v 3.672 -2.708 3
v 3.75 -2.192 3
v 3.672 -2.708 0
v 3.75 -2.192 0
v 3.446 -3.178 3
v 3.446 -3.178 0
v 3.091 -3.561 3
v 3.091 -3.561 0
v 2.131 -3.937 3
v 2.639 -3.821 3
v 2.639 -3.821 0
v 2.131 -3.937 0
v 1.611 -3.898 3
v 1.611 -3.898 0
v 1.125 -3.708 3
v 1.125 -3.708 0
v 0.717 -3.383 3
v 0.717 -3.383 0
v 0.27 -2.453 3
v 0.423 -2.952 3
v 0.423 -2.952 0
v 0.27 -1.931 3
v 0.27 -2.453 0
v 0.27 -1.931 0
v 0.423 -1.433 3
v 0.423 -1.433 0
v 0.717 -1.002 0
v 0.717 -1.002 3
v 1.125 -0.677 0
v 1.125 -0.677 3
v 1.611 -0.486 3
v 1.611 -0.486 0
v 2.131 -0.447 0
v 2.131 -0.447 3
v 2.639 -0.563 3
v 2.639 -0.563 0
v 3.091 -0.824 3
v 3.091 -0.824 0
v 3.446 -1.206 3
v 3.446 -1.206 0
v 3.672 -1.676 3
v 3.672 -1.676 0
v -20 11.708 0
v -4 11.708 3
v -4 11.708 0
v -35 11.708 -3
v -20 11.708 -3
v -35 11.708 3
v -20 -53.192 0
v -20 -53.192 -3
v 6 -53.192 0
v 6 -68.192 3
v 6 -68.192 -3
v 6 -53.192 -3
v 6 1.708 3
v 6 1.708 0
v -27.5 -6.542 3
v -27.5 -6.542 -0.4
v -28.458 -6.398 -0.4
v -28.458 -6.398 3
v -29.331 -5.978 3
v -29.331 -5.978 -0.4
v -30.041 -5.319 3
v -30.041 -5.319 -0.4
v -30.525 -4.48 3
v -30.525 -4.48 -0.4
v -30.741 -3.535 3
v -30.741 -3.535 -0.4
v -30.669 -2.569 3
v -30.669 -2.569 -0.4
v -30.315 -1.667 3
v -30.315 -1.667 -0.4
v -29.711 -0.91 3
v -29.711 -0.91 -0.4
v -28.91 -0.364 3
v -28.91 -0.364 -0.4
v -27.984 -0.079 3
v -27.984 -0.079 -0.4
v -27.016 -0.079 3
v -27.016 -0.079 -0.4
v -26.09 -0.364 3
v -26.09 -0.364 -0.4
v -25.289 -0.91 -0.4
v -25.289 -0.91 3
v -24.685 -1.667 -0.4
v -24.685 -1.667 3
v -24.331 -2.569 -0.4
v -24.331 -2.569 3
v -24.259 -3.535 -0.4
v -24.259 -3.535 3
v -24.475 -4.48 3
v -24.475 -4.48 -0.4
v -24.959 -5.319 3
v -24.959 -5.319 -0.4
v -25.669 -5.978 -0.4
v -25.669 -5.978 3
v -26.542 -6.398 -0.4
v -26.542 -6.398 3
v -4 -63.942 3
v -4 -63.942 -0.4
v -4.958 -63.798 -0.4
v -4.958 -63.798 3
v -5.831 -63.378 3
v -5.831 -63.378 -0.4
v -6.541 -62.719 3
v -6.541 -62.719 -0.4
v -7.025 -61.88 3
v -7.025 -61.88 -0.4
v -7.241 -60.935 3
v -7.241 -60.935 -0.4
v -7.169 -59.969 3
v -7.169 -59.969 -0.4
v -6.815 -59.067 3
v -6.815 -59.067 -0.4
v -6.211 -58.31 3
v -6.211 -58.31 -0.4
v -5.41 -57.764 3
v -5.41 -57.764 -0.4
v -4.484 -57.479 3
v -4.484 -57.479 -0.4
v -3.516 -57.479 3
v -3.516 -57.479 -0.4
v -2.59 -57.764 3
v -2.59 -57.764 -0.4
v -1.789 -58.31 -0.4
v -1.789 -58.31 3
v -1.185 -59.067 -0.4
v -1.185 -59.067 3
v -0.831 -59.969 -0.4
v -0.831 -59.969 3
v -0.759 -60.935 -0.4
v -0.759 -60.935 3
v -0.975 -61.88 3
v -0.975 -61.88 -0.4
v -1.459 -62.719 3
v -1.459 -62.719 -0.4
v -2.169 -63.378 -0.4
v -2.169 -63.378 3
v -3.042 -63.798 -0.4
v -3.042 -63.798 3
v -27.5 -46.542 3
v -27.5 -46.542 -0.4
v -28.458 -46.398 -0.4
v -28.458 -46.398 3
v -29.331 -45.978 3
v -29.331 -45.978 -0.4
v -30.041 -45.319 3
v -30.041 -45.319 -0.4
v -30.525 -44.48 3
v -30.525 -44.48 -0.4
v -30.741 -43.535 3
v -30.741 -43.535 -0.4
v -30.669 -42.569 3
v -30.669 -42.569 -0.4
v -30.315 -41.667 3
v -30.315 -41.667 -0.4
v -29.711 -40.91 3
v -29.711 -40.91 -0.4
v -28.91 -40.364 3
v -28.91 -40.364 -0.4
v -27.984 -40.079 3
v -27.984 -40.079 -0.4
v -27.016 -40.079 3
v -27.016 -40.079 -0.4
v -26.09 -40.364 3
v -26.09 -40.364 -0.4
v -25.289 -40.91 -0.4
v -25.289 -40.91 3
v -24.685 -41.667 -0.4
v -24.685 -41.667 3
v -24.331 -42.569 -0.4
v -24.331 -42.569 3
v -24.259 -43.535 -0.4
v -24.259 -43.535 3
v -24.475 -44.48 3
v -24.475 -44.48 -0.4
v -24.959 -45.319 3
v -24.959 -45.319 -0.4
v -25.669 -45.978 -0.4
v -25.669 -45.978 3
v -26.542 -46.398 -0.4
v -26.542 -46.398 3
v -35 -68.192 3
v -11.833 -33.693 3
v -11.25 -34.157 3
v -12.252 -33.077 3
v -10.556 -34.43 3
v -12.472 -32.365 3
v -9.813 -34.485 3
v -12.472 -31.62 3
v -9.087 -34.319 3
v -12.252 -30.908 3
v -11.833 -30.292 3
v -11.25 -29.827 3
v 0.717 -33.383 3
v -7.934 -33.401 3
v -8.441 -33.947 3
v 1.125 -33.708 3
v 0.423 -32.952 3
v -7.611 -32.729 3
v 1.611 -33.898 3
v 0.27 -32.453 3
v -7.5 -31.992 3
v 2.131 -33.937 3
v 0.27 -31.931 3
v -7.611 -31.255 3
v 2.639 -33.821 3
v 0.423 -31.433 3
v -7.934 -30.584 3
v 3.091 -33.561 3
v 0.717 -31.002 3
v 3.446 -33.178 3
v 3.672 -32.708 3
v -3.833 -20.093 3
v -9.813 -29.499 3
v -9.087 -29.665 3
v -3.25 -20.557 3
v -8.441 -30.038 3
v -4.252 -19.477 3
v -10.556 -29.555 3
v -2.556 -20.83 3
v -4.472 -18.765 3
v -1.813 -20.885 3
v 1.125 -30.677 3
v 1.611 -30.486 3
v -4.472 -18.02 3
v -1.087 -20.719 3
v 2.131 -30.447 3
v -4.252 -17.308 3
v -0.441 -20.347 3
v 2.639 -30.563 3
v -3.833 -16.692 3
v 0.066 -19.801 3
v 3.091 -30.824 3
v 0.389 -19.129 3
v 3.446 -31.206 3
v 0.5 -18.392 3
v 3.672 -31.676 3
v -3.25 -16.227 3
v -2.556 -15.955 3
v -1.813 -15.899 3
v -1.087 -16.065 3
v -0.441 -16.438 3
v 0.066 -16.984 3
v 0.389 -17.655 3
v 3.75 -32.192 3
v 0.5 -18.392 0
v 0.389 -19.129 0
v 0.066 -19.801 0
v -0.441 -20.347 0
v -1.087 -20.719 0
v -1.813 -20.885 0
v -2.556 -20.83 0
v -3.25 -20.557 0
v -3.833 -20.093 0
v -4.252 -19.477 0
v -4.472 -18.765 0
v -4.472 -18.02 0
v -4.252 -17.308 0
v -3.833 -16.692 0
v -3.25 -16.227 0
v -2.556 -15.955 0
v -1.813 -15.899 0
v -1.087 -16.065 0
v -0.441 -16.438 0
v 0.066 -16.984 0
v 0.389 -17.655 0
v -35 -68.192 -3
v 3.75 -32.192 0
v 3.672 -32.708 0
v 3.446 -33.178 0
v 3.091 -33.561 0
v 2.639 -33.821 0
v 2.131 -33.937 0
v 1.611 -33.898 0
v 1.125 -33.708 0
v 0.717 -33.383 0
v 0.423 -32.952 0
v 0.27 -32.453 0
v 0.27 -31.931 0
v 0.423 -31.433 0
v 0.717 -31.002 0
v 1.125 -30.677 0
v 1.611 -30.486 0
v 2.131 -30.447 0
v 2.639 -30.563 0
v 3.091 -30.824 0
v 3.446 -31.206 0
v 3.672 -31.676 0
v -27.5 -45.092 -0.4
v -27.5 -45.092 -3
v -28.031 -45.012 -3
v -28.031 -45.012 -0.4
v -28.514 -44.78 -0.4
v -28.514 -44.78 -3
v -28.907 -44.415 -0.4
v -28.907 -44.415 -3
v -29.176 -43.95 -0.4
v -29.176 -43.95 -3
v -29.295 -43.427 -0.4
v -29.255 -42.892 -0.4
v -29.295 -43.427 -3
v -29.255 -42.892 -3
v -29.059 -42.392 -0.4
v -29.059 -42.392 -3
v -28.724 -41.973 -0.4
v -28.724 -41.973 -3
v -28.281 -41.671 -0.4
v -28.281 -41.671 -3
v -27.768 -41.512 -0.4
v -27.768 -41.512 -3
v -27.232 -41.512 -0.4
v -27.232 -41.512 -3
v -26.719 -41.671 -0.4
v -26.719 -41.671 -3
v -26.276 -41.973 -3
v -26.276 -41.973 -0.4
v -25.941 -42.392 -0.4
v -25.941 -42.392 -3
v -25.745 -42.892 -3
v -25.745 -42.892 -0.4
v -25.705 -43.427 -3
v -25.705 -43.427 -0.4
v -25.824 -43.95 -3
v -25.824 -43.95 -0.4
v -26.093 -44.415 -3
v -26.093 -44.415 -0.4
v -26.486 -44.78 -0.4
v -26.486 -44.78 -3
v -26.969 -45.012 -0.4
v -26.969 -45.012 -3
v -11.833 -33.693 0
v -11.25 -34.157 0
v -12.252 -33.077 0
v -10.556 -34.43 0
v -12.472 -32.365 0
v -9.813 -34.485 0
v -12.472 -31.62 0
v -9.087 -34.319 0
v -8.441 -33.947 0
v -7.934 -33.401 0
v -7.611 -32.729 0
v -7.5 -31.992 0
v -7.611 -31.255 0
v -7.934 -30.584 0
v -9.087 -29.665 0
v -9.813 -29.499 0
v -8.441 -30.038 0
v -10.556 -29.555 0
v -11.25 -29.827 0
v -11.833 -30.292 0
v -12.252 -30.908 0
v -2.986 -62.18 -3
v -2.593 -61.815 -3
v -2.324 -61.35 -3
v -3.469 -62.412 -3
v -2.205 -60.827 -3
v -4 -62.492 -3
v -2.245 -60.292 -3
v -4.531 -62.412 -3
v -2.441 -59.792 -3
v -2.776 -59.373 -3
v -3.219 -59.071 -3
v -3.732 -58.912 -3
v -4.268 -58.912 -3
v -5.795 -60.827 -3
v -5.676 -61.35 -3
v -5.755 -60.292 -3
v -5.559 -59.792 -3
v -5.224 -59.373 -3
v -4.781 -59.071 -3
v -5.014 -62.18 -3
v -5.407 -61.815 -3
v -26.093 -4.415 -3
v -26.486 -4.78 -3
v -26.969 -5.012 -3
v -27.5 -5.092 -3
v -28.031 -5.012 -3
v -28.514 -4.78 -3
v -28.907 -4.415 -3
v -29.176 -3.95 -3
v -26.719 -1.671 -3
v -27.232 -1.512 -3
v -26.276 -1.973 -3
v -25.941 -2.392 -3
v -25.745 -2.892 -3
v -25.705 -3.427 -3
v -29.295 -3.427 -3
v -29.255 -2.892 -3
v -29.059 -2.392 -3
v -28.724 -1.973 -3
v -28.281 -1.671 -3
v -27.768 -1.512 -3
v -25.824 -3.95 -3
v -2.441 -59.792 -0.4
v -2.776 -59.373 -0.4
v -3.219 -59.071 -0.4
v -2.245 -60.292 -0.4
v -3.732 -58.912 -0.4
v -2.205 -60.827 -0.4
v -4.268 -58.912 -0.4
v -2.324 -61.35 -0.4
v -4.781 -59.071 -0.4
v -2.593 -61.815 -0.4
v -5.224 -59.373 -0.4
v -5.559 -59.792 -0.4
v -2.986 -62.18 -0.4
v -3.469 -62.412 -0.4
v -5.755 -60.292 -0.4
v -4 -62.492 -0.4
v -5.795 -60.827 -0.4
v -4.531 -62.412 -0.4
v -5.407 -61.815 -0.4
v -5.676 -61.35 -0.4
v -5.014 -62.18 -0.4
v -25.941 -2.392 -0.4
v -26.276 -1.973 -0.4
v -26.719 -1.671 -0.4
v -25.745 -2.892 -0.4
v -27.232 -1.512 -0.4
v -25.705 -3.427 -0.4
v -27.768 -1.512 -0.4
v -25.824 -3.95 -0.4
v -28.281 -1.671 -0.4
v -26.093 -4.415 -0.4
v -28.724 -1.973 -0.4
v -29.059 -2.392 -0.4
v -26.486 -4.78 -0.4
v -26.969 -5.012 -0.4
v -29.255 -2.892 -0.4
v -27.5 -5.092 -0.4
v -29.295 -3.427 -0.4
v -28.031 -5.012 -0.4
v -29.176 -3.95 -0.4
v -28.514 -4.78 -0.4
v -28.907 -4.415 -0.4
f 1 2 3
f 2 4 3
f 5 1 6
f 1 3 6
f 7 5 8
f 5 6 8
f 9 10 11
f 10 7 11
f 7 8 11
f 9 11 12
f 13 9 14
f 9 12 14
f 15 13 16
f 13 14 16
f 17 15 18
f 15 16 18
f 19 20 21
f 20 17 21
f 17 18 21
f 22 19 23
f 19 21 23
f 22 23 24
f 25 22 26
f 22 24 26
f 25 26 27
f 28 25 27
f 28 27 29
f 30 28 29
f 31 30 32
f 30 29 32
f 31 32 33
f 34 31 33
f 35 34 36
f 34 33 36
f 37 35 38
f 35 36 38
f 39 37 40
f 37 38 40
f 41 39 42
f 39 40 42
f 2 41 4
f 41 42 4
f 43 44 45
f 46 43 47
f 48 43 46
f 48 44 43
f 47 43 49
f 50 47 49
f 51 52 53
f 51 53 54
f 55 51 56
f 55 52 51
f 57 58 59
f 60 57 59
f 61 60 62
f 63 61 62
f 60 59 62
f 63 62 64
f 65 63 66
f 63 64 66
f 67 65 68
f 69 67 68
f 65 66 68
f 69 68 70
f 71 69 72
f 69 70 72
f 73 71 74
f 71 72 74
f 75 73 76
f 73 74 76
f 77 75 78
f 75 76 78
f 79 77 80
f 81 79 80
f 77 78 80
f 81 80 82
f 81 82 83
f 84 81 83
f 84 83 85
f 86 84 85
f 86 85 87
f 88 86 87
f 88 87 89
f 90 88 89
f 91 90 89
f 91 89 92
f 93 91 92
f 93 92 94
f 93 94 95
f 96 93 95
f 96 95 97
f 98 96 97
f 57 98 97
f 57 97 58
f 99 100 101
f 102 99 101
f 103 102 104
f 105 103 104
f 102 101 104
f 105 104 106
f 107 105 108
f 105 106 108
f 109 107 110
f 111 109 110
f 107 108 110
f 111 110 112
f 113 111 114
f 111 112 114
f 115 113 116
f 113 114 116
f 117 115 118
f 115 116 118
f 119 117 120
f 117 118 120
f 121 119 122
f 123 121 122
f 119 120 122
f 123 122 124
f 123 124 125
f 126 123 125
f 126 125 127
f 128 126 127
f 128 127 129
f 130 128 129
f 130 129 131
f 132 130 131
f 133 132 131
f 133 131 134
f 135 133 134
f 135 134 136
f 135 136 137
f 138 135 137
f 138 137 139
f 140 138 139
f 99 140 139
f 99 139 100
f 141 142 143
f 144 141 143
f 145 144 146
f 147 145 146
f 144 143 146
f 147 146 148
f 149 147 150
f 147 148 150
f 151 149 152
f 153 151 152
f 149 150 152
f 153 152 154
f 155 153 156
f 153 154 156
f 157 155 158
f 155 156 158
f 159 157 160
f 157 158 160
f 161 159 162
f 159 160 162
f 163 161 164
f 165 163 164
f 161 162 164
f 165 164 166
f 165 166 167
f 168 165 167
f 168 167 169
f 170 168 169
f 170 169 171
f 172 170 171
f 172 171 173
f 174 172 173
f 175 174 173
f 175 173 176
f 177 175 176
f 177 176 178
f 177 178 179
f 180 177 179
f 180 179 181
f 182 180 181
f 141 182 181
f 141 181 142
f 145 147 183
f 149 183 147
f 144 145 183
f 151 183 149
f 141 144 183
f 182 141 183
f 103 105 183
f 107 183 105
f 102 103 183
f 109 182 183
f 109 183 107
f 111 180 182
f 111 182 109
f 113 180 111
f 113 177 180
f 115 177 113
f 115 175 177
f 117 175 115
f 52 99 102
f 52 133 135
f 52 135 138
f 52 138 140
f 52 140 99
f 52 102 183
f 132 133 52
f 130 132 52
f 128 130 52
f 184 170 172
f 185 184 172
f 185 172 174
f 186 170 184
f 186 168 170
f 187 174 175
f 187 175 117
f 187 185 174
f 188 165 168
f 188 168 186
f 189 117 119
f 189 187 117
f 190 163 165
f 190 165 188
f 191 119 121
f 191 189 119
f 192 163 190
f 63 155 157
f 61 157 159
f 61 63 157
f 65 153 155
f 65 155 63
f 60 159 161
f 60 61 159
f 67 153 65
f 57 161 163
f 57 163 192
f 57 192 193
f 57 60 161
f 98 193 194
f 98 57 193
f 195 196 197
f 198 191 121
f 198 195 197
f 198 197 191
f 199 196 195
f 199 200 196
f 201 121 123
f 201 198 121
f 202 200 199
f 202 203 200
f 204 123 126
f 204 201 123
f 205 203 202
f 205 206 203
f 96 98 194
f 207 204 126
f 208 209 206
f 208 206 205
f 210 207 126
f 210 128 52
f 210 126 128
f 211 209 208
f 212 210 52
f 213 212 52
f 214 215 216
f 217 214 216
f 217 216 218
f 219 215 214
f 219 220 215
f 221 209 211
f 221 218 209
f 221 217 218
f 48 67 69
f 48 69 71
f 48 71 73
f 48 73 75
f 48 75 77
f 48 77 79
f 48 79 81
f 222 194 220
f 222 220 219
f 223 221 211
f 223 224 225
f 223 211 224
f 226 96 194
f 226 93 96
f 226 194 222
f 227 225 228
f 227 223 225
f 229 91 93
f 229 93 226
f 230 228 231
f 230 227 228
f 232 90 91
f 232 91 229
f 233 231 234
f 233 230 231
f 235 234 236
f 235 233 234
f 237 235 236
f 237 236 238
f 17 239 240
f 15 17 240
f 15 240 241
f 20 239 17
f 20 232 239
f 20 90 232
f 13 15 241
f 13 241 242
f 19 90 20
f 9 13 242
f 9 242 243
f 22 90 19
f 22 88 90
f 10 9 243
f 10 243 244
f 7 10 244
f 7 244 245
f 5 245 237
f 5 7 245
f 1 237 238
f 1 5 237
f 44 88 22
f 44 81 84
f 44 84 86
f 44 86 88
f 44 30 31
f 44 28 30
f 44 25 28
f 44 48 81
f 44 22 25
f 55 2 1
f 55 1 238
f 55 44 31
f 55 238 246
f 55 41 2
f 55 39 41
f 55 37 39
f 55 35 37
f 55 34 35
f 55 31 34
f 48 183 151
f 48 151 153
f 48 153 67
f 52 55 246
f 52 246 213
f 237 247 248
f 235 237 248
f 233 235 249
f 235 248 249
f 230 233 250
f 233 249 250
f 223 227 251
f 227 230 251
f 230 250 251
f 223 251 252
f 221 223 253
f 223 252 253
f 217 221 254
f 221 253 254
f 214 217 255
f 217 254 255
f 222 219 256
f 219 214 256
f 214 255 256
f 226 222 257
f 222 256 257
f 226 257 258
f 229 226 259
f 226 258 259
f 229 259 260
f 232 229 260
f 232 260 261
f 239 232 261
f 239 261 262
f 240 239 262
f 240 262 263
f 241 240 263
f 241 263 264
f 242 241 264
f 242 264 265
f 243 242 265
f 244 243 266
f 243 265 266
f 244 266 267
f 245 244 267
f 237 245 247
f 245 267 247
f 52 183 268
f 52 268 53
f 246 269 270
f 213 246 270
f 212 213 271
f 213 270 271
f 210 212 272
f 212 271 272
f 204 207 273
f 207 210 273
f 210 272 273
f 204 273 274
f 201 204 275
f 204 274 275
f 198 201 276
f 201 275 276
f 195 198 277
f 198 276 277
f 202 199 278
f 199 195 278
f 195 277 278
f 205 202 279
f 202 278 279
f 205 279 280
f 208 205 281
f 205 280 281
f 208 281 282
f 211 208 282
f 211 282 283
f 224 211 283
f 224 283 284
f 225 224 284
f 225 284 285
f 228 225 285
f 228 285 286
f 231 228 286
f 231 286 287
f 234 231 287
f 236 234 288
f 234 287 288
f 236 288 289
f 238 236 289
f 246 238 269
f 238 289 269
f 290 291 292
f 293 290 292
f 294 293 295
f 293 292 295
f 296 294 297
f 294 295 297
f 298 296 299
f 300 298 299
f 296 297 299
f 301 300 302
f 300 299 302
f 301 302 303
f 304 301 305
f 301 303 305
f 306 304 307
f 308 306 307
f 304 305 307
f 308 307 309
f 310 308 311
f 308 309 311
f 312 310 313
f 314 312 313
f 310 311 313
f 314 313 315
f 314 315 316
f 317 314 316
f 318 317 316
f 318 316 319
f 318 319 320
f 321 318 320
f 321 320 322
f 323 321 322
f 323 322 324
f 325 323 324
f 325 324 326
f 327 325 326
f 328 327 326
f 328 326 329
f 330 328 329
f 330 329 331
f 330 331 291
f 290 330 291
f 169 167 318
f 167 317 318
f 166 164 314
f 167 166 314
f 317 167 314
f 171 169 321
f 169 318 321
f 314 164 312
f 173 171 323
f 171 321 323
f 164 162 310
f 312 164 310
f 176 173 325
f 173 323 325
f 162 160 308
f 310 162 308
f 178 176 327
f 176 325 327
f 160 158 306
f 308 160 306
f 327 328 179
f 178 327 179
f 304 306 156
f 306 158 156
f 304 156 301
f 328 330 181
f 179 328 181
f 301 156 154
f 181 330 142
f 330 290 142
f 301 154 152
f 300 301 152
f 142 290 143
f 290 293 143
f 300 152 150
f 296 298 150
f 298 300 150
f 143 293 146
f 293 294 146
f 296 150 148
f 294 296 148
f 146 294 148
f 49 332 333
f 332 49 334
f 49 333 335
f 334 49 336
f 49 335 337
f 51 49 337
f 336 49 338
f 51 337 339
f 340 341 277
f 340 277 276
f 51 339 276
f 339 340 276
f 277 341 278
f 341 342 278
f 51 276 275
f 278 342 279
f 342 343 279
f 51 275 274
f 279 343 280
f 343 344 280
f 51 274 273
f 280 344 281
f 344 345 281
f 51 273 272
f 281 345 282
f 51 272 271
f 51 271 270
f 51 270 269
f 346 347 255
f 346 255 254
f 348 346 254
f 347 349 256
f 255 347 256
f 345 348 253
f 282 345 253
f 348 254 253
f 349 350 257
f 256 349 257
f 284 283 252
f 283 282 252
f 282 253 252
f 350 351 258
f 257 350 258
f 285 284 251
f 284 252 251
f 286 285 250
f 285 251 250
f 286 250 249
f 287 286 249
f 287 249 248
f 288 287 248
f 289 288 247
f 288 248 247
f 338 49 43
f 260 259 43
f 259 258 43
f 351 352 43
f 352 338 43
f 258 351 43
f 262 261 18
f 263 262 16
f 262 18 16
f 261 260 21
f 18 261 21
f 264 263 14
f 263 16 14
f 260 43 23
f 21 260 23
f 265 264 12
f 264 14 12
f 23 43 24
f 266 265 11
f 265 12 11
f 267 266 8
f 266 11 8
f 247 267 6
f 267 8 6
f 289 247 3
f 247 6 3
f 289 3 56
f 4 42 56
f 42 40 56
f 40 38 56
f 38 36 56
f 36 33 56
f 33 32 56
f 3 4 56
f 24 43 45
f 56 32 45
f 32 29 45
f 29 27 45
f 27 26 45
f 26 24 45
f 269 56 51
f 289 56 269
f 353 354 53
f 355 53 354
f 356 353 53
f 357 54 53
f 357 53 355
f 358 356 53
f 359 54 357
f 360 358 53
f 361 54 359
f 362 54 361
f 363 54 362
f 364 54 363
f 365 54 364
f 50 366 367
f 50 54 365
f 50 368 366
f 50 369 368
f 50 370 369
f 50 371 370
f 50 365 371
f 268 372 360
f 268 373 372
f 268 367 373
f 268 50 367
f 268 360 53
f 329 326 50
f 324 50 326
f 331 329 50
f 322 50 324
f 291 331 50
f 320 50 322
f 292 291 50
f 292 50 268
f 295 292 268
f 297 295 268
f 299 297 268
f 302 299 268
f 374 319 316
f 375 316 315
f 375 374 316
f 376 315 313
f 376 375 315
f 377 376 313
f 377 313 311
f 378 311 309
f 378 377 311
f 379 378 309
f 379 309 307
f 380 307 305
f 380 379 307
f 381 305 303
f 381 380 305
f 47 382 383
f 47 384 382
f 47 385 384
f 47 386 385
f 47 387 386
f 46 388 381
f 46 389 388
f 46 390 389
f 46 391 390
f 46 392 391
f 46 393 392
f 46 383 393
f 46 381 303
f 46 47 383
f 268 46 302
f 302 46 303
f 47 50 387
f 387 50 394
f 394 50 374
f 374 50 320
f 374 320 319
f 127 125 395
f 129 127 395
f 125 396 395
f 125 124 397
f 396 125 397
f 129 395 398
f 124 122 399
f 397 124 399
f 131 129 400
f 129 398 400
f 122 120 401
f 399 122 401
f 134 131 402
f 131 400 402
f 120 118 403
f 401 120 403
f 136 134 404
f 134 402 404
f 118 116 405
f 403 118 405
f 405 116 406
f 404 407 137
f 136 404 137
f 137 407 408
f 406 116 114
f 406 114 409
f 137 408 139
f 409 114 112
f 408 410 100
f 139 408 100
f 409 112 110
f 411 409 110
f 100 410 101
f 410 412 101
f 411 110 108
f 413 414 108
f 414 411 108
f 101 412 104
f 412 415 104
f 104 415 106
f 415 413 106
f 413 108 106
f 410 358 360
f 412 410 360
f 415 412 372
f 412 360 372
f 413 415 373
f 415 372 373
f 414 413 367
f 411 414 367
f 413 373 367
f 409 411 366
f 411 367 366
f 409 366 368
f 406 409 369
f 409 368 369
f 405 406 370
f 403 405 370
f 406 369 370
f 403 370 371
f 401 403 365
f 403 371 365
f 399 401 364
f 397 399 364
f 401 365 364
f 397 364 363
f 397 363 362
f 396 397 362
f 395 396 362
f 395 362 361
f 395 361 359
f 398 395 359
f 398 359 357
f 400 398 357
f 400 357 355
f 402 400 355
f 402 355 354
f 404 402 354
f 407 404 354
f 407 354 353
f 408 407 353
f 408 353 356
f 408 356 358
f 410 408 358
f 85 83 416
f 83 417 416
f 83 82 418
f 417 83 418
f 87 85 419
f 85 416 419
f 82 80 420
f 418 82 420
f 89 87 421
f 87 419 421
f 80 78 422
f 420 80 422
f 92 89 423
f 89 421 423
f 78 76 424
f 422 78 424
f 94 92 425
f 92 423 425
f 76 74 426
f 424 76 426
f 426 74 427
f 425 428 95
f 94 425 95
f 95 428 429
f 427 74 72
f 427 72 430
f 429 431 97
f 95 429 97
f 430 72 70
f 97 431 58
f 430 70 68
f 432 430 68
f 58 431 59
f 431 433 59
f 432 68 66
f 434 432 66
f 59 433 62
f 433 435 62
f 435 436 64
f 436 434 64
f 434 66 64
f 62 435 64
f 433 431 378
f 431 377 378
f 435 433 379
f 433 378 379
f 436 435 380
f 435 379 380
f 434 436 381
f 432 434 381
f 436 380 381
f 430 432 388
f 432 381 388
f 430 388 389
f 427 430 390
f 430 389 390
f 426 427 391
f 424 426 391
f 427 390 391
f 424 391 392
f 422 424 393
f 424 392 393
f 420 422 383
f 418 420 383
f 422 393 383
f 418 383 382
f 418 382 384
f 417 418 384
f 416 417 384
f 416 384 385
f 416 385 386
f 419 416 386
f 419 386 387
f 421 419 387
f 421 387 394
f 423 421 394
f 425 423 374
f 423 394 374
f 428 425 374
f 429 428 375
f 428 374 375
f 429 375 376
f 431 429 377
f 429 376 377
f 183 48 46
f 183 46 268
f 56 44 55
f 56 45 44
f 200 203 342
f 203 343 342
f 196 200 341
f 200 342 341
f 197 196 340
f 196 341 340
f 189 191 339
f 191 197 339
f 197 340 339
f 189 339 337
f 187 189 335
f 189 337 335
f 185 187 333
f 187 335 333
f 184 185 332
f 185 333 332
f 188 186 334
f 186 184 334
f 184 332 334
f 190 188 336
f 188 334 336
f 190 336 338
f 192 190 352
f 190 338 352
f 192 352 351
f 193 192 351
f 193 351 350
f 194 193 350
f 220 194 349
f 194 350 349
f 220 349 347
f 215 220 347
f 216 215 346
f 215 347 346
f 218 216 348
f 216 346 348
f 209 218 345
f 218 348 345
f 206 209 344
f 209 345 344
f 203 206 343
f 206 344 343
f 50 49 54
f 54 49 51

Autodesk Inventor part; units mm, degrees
ref_plane "YZ Plane" through (0, 0, 0) normal (1, 0, 0) x (0, 1, 0)
ref_plane "XZ Plane" through (0, 0, 0) normal (0, 1, 0) x (-1, 0, 0)
ref_plane "XY Plane" through (0, 0, 0) normal (0, 0, 1) x (1, 0, 0)
sketch "Sketch1" plane through (0, 0, 0) normal (0, 0, 1) x (1, 0, 0)
  line L0 (-4, 11.7077) -> (6, 1.7077)
  line L1 (-4, 11.7077) -> (-5, 11.7077)
  arc A0 (-5, 11.7077) -> (-6, 10.7077) centre (-5, 10.7077) ccw
  line L2 (-6, 10.7077) -> (-6, -9.2784)
  arc A1 (-6, -9.2784) -> (-4.6842, -10.2272) centre (-5, -9.2784) ccw
  arc A2 (3.1184, -11.5061) -> (-4.6842, -10.2272) centre (-2, -18.2923) ccw
  arc A3 (3.1184, -11.5061) -> (3.7205, -11.7077) centre (3.7205, -10.7077) ccw
  line L3 (3.7205, -11.7077) -> (5, -11.7077)
  arc A4 (5, -11.7077) -> (6, -10.7077) centre (5, -10.7077) ccw
  line L4 (6, -10.7077) -> (6, 1.7077)
  arc A5 (5, -36.8923) -> (6, -35.8923) centre (5, -35.8923) ccw
  line L5 (6, -35.8923) -> (6, -27.7923)
  arc A6 (6, -27.7923) -> (5, -26.7923) centre (5, -27.7923) ccw
  line L6 (5, -26.7923) -> (-1.4303, -26.7923)
  arc A7 (-1.4303, -26.7923) -> (-2.3324, -28.2239) centre (-1.4303, -27.7923) ccw
  arc A8 (-2.2902, -35.4712) -> (-2.3324, -28.2239) centre (-10, -31.8923) ccw
  arc A9 (-2.2902, -35.4712) -> (-1.3832, -36.8923) centre (-1.3832, -35.8923) ccw
  line L7 (-1.3832, -36.8923) -> (5, -36.8923)
  line L8 (6, -53.1923) -> (6, -35.8923)
  line L9 (6, -27.7923) -> (6, -10.7077)
  line L10 (-5, 11.7077) -> (-20, 11.7077)
  line L11 (-20, 11.7077) -> (-35, 11.7077)
  line L12 (6, -68.1923) -> (6, -53.1923)
  line L13 (-35, 306.8077) -> (-35, -53.1923)
  line L14 (-35, -68.1923) -> (-35, -53.1923)
  line L15 (-20, -68.1923) -> (-35, -68.1923)
  line L16 (480, -68.1923) -> (-20, -68.1923)
  circle A10 centre (2, -2.1923) radius 1.4
  circle A11 centre (2, -32.1923) radius 1.4
  circle A12 centre (2, -2.1923) radius 1.75
  circle A13 centre (2, -32.1923) radius 1.75
  circle A14 centre (-10, -31.9923) radius 2.5
  circle A15 centre (-2, -18.3923) radius 2.5
  point P0 (0, 0)
  dimension "d18" = 3.5
extrude "Extrusion1" add sketch "Sketch1" along normal blind 3 contours L0 L4 A4 L3 A3 A2 A1 L2 A0 L1 | A0 L2 A1 A2 A3 L3 A4 L9 A6 L6 A7 A8 A9 L7 A5 L8 L12 L16 L15 L14 L13 L11 L10 | L5 A5 L7 A9 A8 A7 L6 A6
sketch "Sketch2" plane through (0, 0, 0) normal (0, 0, -1) x (-1, 0, 0)
  line L0 (-6, -68.1923) -> (-6, 1.7077)
  line L1 (35, -68.1923) -> (-6, -68.1923)
  line L2 (35, 11.7077) -> (35, -68.1923)
  line L3 (4, 11.7077) -> (35, 11.7077)
  line L4 (-6, 1.7077) -> (4, 11.7077)
  line L5 (20, 11.7077) -> (20, -53.1923)
  line L6 (20, -53.1923) -> (-6, -53.1923)
  line L7 (-6, -68.1923) -> (-6, 1.7077)
  point P0 (0, 0)
  point P1 (7, -53.1923)
  dimension "d2" = 15
  dimension "d3" = 15
extrude "Extrusion2" add sketch "Sketch2" along normal blind 3 contours L0 L6 L5 L3 L2 L1
sketch "Sketch3" plane through (0, 0, 3) normal (0, 0, 1) x (1, 0, 0)
  line L0 (6, -68.1923) -> (6, 1.7077)
  line L1 (6, 1.7077) -> (-4, 11.7077)
  line L2 (-4, 11.7077) -> (-35, 11.7077)
  line L3 (-35, 11.7077) -> (-35, -68.1923)
  line L4 (-35, -68.1923) -> (6, -68.1923)
  circle A0 centre (2, -2.2923) radius 1.4
  circle A1 centre (2, -32.2923) radius 1.4
  point P0 (0, 0)
  point P1 (-27.5, -3.2923)
  point P2 (-27.5, -43.2923)
  point P3 (-4, -60.6923)
  dimension "d6" = 7.5
  dimension "d7" = 10
  dimension "d8" = 7.5
  dimension "d9" = 15
  dimension "d10" = 40
hole "Hole1" at (-27.5, -3.2923, 3) at (-27.5, -43.2923, 3) at (-4, -60.6923, 3) direction (0, 0, -1) diameter 3.6 end through all counterbore diameter 6.5 counterbore depth 3.4
equation "\"d3\" = d2"
equation "\"d8\" = d6"
properties part number "Alpha Idler Top" material "ABS Plastic"
